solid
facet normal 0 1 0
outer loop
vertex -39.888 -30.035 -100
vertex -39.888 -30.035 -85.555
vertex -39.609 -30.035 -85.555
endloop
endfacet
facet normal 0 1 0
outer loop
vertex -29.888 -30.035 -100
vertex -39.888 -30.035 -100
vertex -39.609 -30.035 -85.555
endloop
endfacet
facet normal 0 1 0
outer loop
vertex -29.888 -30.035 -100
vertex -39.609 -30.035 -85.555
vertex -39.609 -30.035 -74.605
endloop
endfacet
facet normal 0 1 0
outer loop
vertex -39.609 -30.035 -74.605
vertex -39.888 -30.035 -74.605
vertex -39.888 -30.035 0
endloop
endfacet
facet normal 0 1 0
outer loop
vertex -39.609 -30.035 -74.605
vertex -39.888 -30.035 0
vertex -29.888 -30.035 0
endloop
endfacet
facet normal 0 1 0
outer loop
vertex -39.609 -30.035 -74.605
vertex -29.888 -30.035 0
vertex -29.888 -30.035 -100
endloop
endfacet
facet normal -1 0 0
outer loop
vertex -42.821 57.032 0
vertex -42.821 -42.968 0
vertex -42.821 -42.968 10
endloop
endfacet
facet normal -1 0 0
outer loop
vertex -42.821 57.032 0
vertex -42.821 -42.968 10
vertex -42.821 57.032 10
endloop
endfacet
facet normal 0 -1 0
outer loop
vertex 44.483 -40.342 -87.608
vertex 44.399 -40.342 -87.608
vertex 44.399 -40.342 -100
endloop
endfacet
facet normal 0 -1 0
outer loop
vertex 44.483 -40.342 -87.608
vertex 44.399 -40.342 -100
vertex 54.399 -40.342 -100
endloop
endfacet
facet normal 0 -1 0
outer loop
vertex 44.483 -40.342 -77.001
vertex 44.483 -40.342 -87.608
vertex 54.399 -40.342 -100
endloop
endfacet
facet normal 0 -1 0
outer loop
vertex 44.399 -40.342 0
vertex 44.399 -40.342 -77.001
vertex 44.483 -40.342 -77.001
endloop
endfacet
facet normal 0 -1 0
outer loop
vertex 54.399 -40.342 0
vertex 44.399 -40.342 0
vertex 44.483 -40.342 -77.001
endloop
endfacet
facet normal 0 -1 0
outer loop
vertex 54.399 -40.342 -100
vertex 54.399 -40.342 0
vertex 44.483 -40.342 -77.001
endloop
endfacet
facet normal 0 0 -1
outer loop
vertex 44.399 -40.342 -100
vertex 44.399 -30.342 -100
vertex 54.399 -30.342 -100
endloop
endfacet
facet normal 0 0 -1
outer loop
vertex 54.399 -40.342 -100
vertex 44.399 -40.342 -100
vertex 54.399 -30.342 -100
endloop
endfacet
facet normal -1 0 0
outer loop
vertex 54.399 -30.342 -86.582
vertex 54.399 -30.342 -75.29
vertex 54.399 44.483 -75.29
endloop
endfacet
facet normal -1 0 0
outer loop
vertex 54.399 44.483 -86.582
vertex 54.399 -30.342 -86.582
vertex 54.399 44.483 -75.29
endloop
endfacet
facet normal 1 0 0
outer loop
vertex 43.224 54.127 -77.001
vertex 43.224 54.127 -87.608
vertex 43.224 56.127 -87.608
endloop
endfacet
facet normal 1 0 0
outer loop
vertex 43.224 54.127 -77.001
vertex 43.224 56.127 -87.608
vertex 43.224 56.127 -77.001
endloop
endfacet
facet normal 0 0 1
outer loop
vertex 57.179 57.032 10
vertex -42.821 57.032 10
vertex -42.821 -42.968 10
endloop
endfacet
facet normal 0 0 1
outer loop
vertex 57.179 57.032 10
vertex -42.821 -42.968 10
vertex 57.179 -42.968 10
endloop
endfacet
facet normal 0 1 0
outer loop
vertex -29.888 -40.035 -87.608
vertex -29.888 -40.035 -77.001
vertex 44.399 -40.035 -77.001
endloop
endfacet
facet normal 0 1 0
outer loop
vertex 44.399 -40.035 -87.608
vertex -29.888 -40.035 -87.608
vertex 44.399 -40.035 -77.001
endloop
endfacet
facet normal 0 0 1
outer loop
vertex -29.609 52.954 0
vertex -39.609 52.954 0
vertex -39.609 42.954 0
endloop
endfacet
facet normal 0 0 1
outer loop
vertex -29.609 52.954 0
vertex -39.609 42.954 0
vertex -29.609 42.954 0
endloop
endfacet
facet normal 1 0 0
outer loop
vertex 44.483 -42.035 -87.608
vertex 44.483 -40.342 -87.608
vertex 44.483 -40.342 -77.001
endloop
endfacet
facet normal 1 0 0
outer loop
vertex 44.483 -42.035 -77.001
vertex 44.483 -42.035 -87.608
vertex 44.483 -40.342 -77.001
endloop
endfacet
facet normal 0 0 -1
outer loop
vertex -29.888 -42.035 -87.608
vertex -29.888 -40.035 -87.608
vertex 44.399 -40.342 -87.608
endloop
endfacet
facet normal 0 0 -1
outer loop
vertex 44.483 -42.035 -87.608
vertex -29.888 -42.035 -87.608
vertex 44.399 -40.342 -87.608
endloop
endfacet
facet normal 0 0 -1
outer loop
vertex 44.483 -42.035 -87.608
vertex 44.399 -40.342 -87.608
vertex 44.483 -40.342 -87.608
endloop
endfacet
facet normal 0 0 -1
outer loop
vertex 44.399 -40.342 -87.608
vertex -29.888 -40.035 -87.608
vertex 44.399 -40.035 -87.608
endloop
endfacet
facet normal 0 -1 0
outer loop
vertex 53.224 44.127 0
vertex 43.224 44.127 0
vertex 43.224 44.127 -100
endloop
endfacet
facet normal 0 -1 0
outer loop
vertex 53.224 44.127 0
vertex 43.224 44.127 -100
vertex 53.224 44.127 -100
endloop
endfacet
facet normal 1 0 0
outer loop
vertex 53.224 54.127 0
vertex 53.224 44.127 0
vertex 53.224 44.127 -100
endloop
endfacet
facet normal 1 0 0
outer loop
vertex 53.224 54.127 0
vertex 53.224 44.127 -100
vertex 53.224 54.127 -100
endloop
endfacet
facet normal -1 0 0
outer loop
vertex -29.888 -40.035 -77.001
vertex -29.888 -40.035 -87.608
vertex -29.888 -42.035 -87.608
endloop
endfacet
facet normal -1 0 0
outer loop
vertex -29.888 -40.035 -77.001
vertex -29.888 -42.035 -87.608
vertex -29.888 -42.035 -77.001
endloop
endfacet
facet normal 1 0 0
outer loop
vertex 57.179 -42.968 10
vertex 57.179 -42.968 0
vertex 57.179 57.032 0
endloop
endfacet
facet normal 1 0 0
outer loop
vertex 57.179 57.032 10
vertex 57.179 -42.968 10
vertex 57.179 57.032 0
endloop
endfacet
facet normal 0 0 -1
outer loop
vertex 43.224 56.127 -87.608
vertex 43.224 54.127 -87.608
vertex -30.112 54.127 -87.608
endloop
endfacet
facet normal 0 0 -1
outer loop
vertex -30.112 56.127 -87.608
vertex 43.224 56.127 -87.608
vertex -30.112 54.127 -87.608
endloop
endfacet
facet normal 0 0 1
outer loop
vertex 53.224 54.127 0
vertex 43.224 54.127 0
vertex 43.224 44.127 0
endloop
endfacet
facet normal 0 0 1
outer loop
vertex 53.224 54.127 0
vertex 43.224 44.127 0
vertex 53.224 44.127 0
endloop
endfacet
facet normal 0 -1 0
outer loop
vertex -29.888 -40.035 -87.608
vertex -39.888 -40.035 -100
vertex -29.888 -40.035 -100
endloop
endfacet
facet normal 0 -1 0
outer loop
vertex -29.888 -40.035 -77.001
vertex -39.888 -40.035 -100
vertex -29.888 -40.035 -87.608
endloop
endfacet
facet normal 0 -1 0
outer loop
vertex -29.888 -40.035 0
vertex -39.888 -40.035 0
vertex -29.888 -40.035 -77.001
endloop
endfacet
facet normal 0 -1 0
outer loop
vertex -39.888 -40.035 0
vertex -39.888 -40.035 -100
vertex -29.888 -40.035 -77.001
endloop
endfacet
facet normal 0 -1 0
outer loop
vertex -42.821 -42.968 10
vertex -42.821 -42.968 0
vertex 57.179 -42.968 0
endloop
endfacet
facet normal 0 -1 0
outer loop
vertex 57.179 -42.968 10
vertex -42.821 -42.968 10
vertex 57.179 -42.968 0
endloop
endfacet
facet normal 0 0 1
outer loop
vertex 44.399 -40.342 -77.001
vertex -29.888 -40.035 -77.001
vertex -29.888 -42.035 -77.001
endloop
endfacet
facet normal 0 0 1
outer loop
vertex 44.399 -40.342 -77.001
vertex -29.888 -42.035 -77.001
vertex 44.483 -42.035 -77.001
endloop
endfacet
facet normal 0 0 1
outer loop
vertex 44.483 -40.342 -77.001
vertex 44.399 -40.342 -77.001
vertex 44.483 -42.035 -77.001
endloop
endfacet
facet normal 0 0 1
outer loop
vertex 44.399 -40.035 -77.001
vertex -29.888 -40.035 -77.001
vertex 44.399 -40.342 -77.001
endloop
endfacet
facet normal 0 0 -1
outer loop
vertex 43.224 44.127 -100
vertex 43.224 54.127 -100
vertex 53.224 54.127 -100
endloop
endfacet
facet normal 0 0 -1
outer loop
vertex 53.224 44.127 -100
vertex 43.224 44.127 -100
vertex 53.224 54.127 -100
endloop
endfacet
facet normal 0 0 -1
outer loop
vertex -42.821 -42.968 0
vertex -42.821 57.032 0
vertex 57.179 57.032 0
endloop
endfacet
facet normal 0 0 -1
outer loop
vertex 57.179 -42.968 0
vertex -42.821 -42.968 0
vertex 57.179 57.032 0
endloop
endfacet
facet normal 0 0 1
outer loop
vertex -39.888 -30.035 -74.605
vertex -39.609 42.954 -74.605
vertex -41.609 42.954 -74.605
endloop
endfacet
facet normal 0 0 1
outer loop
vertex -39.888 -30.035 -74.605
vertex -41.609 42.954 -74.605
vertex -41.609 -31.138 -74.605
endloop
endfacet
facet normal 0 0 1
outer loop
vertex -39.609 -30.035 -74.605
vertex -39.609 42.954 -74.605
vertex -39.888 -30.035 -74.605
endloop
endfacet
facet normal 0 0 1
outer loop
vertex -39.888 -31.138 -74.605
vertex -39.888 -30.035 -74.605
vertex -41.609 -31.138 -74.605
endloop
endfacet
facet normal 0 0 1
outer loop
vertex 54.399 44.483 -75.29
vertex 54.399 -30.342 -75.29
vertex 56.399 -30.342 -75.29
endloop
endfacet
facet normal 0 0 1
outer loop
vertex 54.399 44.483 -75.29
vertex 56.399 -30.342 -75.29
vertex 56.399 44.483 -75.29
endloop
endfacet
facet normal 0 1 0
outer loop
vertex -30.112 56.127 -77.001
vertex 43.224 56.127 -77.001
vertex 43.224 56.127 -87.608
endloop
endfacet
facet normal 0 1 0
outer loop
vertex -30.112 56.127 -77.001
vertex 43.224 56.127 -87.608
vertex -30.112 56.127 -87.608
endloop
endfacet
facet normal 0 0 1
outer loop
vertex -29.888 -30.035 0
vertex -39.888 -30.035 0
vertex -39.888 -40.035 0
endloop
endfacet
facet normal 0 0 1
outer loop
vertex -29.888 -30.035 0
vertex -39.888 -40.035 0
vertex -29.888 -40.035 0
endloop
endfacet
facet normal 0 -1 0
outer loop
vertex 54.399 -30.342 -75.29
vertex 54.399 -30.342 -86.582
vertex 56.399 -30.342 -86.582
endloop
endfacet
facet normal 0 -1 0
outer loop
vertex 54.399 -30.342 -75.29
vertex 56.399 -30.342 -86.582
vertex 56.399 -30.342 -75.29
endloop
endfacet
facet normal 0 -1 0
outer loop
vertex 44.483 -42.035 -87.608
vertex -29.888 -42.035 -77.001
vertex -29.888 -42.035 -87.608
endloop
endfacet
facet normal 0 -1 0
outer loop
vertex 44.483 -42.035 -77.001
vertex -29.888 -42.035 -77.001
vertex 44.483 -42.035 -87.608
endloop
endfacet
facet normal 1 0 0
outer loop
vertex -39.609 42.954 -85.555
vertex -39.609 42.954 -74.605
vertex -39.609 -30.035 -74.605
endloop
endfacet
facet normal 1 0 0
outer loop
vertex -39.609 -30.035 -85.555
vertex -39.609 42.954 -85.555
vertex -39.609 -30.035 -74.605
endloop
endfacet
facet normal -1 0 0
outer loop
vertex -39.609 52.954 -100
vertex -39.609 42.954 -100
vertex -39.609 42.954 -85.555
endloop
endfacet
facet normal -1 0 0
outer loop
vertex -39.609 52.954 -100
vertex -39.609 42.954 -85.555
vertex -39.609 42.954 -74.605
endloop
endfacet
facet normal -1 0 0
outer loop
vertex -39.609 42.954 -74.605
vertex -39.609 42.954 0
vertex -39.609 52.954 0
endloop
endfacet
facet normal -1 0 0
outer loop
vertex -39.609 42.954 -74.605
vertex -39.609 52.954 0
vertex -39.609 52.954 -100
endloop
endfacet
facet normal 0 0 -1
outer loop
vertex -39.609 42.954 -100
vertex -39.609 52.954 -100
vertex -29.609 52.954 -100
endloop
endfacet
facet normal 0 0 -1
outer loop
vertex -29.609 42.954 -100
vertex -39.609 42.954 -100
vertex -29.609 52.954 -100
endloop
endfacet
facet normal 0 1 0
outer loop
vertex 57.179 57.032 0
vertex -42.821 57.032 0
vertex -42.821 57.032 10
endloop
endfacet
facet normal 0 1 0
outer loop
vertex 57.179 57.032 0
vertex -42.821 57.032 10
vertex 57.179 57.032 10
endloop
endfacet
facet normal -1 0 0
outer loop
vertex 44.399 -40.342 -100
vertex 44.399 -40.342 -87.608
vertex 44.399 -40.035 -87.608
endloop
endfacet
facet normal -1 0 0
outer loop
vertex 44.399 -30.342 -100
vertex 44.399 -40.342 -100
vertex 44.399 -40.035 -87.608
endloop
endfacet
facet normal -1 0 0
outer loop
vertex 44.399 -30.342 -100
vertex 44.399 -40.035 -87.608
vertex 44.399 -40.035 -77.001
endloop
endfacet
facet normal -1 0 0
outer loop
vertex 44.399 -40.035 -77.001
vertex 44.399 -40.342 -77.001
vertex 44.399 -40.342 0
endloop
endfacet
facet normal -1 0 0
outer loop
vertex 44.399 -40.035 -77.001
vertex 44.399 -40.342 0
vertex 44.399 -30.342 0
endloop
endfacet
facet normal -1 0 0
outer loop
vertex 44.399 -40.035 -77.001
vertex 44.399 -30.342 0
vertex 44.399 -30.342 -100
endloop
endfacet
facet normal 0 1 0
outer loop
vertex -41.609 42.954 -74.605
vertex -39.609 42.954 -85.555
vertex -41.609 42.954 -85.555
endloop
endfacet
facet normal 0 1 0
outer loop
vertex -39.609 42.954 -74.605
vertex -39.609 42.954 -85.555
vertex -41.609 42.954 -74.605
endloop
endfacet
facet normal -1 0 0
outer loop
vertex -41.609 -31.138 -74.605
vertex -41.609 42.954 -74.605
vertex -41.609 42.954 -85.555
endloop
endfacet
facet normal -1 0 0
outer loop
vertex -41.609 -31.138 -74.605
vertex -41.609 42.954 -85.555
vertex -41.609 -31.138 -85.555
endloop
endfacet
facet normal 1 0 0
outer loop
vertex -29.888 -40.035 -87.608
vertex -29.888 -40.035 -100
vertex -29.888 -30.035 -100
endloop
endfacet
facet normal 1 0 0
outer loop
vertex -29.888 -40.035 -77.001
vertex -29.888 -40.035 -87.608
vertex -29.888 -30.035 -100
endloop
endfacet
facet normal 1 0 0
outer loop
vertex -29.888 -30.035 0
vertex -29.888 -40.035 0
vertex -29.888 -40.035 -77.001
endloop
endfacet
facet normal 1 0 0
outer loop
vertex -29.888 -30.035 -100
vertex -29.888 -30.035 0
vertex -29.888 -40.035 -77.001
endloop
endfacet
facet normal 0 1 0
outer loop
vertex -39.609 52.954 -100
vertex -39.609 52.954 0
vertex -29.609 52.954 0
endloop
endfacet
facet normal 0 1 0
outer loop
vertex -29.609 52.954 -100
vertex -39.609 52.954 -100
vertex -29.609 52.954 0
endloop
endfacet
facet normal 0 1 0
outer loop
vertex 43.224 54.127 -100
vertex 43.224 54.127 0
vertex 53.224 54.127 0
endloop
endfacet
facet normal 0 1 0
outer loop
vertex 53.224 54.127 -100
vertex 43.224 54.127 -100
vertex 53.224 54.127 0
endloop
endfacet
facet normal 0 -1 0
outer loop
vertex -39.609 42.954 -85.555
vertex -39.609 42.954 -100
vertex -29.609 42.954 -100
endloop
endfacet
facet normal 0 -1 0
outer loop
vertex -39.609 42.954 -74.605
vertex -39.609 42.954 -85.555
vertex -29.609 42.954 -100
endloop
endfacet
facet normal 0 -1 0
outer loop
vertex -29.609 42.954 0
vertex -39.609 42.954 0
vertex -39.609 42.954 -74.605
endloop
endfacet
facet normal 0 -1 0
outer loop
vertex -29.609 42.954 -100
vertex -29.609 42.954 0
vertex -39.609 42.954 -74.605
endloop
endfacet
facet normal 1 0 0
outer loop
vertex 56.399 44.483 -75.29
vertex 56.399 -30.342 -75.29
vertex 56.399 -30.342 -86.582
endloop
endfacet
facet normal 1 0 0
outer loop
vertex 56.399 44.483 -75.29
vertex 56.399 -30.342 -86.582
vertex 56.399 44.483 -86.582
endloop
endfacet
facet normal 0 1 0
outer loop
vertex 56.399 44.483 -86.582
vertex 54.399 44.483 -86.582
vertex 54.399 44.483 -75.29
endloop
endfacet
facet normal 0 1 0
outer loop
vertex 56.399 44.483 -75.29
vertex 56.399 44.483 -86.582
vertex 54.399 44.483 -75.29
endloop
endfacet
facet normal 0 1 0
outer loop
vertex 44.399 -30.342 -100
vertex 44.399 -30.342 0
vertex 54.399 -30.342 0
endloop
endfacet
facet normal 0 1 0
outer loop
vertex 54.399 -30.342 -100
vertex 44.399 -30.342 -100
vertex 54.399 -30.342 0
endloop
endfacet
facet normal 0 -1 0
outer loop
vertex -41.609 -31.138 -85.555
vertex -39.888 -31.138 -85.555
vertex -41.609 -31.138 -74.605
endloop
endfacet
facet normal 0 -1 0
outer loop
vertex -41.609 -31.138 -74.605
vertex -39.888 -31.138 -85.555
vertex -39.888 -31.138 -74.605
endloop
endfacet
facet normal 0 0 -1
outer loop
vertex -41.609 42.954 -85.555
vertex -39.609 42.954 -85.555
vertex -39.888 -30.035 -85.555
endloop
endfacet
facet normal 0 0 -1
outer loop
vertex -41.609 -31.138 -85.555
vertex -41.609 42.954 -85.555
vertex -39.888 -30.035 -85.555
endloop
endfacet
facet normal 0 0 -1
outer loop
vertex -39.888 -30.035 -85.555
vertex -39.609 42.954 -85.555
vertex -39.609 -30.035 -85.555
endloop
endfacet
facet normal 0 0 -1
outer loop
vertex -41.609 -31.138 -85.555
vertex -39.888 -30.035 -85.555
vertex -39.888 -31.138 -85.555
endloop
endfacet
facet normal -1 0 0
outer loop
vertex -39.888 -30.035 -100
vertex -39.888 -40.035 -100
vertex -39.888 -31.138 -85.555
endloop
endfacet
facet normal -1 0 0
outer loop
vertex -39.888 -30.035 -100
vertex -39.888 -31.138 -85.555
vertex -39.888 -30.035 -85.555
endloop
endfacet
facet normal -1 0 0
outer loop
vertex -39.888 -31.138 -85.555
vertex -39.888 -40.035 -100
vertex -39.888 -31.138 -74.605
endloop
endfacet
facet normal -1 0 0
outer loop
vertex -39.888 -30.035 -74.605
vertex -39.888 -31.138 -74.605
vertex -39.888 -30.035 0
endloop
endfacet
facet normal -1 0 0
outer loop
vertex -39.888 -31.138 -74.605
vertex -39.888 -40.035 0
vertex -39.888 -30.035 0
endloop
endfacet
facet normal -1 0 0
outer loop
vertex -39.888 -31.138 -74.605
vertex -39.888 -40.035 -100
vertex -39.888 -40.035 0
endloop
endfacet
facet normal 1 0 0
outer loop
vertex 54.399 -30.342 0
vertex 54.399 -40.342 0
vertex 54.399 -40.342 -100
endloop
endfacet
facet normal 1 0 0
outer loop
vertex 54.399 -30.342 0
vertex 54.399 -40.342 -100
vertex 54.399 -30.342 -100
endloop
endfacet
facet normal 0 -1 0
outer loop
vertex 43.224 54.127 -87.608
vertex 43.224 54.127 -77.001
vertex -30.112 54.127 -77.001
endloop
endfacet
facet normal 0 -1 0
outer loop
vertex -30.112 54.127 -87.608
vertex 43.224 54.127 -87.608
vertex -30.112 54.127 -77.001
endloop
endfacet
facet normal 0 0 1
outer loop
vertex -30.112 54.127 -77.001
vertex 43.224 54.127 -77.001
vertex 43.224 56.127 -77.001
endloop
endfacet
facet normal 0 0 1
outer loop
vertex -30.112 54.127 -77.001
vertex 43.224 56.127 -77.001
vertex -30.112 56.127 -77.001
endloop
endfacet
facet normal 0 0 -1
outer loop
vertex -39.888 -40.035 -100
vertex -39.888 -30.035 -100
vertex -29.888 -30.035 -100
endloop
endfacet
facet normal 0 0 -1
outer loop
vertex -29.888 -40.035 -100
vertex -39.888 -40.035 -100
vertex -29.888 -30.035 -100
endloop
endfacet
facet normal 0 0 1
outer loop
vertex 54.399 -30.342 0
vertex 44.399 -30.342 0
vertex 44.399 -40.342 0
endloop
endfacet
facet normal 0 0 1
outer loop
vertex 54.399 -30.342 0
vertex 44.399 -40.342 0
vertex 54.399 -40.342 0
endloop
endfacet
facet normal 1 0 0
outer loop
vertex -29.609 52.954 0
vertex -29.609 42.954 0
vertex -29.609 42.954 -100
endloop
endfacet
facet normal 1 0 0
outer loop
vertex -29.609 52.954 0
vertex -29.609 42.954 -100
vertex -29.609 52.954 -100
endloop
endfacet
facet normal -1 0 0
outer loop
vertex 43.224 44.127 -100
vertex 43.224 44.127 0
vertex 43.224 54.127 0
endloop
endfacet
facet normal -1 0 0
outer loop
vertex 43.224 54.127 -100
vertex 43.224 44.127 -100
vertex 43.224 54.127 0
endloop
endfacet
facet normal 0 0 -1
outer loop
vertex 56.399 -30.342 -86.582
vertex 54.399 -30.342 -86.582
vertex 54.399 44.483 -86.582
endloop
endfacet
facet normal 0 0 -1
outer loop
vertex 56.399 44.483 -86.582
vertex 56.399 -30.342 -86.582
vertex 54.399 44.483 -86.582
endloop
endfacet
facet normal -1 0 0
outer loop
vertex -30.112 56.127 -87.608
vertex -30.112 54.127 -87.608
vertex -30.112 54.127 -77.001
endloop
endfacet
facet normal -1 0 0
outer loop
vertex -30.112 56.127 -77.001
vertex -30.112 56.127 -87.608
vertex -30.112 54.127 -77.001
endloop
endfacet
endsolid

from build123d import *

# Parameters (mm, degrees)
F1_W      = 10
F1_H      = 10
F5_DEPTH  = 100
F2_W      = 10
F2_H      = 10
F6_DEPTH  = 100
F3_W      = 10
F3_H      = 10
F7_DEPTH  = 100
F4_W      = 10
F4_H      = 10
F8_DEPTH  = 100
F0_W      = 100
F0_H      = 100
F9_DEPTH  = 10
F10_W     = 74.825423
F10_H     = 11.291899
F11_DEPTH = 2
F12_W     = 74.37151
F12_H     = 10.607541
F13_DEPTH = 2
F14_W     = 74.092182
F14_H     = 10.949716
F15_DEPTH = 2
F16_W     = 73.335298
F16_H     = 10.607541
F17_DEPTH = 2


with BuildPart() as f5:
    # F1 (on Top) → F5 (new body)
    with BuildSketch(Plane.XY):
        with Locations((-34.888266, -35.034918)):
            Rectangle(F1_W, F1_H)
    extrude(amount=-F5_DEPTH)



with BuildPart() as f6:
    # F2 (on face) → F6 (new body)
    with BuildSketch(Plane.XY):
        with Locations((-34.608942, 47.953915)):
            Rectangle(F2_W, F2_H)
    extrude(amount=-F6_DEPTH)


with BuildPart() as f7:
    # F3 (on face) → F7 (new body)
    with BuildSketch(Plane.XY):
        with Locations((49.399175, -35.342179)):
            Rectangle(F3_W, F3_H)
    extrude(amount=-F7_DEPTH)


with BuildPart() as f8:
    # F4 (on face) → F8 (new body)
    with BuildSketch(Plane.XY):
        with Locations((48.223566, 49.127094)):
            Rectangle(F4_W, F4_H)
    extrude(amount=-F8_DEPTH)


with BuildPart() as f9:
    # F0 (on Top) → F9 (new body)
    with BuildSketch(Plane.XY):
        with Locations((7.178768, 7.032122)):
            Rectangle(F0_W, F0_H)
    extrude(amount=F9_DEPTH)


with BuildPart() as f11:
    # F10 (on face) → F11 (new body)
    with BuildSketch(Plane.YZ.offset(54.399175)):
        with Locations((7.070533, -80.935757)):
            Rectangle(F10_W, F10_H)
    extrude(amount=F11_DEPTH)


with BuildPart() as f5_1:
    add(f5.part)

    add(f7.part)  # F13 merges F7
    # F12 (on face) → F13 (join)
    with BuildSketch(Plane.XZ.offset(40.034918)):
        with Locations((7.297489, -82.30447)):
            Rectangle(F12_W, F12_H)
    extrude(amount=F13_DEPTH)


    add(f6.part)  # F15 merges F6
    # F14 (on face) → F15 (join)
    with BuildSketch(Plane(origin=(-39.608942, 0, 0), x_dir=(0, -1, 0), z_dir=(-1, 0, 0))):
        with Locations((-5.907824, -80.080308)):
            Rectangle(F14_W, F14_H)
    extrude(amount=F15_DEPTH)


with BuildPart() as f17:
    # F16 (on face) → F17 (new body)
    with BuildSketch(Plane(origin=(0, 54.127094, 0), x_dir=(-1, 0, 0), z_dir=(0, 1, 0))):
        with Locations((-6.555917, -82.30447)):
            Rectangle(F16_W, F16_H)
    extrude(amount=F17_DEPTH)


solid = Compound([f8.part, f9.part, f11.part, f5_1.part, f17.part])
